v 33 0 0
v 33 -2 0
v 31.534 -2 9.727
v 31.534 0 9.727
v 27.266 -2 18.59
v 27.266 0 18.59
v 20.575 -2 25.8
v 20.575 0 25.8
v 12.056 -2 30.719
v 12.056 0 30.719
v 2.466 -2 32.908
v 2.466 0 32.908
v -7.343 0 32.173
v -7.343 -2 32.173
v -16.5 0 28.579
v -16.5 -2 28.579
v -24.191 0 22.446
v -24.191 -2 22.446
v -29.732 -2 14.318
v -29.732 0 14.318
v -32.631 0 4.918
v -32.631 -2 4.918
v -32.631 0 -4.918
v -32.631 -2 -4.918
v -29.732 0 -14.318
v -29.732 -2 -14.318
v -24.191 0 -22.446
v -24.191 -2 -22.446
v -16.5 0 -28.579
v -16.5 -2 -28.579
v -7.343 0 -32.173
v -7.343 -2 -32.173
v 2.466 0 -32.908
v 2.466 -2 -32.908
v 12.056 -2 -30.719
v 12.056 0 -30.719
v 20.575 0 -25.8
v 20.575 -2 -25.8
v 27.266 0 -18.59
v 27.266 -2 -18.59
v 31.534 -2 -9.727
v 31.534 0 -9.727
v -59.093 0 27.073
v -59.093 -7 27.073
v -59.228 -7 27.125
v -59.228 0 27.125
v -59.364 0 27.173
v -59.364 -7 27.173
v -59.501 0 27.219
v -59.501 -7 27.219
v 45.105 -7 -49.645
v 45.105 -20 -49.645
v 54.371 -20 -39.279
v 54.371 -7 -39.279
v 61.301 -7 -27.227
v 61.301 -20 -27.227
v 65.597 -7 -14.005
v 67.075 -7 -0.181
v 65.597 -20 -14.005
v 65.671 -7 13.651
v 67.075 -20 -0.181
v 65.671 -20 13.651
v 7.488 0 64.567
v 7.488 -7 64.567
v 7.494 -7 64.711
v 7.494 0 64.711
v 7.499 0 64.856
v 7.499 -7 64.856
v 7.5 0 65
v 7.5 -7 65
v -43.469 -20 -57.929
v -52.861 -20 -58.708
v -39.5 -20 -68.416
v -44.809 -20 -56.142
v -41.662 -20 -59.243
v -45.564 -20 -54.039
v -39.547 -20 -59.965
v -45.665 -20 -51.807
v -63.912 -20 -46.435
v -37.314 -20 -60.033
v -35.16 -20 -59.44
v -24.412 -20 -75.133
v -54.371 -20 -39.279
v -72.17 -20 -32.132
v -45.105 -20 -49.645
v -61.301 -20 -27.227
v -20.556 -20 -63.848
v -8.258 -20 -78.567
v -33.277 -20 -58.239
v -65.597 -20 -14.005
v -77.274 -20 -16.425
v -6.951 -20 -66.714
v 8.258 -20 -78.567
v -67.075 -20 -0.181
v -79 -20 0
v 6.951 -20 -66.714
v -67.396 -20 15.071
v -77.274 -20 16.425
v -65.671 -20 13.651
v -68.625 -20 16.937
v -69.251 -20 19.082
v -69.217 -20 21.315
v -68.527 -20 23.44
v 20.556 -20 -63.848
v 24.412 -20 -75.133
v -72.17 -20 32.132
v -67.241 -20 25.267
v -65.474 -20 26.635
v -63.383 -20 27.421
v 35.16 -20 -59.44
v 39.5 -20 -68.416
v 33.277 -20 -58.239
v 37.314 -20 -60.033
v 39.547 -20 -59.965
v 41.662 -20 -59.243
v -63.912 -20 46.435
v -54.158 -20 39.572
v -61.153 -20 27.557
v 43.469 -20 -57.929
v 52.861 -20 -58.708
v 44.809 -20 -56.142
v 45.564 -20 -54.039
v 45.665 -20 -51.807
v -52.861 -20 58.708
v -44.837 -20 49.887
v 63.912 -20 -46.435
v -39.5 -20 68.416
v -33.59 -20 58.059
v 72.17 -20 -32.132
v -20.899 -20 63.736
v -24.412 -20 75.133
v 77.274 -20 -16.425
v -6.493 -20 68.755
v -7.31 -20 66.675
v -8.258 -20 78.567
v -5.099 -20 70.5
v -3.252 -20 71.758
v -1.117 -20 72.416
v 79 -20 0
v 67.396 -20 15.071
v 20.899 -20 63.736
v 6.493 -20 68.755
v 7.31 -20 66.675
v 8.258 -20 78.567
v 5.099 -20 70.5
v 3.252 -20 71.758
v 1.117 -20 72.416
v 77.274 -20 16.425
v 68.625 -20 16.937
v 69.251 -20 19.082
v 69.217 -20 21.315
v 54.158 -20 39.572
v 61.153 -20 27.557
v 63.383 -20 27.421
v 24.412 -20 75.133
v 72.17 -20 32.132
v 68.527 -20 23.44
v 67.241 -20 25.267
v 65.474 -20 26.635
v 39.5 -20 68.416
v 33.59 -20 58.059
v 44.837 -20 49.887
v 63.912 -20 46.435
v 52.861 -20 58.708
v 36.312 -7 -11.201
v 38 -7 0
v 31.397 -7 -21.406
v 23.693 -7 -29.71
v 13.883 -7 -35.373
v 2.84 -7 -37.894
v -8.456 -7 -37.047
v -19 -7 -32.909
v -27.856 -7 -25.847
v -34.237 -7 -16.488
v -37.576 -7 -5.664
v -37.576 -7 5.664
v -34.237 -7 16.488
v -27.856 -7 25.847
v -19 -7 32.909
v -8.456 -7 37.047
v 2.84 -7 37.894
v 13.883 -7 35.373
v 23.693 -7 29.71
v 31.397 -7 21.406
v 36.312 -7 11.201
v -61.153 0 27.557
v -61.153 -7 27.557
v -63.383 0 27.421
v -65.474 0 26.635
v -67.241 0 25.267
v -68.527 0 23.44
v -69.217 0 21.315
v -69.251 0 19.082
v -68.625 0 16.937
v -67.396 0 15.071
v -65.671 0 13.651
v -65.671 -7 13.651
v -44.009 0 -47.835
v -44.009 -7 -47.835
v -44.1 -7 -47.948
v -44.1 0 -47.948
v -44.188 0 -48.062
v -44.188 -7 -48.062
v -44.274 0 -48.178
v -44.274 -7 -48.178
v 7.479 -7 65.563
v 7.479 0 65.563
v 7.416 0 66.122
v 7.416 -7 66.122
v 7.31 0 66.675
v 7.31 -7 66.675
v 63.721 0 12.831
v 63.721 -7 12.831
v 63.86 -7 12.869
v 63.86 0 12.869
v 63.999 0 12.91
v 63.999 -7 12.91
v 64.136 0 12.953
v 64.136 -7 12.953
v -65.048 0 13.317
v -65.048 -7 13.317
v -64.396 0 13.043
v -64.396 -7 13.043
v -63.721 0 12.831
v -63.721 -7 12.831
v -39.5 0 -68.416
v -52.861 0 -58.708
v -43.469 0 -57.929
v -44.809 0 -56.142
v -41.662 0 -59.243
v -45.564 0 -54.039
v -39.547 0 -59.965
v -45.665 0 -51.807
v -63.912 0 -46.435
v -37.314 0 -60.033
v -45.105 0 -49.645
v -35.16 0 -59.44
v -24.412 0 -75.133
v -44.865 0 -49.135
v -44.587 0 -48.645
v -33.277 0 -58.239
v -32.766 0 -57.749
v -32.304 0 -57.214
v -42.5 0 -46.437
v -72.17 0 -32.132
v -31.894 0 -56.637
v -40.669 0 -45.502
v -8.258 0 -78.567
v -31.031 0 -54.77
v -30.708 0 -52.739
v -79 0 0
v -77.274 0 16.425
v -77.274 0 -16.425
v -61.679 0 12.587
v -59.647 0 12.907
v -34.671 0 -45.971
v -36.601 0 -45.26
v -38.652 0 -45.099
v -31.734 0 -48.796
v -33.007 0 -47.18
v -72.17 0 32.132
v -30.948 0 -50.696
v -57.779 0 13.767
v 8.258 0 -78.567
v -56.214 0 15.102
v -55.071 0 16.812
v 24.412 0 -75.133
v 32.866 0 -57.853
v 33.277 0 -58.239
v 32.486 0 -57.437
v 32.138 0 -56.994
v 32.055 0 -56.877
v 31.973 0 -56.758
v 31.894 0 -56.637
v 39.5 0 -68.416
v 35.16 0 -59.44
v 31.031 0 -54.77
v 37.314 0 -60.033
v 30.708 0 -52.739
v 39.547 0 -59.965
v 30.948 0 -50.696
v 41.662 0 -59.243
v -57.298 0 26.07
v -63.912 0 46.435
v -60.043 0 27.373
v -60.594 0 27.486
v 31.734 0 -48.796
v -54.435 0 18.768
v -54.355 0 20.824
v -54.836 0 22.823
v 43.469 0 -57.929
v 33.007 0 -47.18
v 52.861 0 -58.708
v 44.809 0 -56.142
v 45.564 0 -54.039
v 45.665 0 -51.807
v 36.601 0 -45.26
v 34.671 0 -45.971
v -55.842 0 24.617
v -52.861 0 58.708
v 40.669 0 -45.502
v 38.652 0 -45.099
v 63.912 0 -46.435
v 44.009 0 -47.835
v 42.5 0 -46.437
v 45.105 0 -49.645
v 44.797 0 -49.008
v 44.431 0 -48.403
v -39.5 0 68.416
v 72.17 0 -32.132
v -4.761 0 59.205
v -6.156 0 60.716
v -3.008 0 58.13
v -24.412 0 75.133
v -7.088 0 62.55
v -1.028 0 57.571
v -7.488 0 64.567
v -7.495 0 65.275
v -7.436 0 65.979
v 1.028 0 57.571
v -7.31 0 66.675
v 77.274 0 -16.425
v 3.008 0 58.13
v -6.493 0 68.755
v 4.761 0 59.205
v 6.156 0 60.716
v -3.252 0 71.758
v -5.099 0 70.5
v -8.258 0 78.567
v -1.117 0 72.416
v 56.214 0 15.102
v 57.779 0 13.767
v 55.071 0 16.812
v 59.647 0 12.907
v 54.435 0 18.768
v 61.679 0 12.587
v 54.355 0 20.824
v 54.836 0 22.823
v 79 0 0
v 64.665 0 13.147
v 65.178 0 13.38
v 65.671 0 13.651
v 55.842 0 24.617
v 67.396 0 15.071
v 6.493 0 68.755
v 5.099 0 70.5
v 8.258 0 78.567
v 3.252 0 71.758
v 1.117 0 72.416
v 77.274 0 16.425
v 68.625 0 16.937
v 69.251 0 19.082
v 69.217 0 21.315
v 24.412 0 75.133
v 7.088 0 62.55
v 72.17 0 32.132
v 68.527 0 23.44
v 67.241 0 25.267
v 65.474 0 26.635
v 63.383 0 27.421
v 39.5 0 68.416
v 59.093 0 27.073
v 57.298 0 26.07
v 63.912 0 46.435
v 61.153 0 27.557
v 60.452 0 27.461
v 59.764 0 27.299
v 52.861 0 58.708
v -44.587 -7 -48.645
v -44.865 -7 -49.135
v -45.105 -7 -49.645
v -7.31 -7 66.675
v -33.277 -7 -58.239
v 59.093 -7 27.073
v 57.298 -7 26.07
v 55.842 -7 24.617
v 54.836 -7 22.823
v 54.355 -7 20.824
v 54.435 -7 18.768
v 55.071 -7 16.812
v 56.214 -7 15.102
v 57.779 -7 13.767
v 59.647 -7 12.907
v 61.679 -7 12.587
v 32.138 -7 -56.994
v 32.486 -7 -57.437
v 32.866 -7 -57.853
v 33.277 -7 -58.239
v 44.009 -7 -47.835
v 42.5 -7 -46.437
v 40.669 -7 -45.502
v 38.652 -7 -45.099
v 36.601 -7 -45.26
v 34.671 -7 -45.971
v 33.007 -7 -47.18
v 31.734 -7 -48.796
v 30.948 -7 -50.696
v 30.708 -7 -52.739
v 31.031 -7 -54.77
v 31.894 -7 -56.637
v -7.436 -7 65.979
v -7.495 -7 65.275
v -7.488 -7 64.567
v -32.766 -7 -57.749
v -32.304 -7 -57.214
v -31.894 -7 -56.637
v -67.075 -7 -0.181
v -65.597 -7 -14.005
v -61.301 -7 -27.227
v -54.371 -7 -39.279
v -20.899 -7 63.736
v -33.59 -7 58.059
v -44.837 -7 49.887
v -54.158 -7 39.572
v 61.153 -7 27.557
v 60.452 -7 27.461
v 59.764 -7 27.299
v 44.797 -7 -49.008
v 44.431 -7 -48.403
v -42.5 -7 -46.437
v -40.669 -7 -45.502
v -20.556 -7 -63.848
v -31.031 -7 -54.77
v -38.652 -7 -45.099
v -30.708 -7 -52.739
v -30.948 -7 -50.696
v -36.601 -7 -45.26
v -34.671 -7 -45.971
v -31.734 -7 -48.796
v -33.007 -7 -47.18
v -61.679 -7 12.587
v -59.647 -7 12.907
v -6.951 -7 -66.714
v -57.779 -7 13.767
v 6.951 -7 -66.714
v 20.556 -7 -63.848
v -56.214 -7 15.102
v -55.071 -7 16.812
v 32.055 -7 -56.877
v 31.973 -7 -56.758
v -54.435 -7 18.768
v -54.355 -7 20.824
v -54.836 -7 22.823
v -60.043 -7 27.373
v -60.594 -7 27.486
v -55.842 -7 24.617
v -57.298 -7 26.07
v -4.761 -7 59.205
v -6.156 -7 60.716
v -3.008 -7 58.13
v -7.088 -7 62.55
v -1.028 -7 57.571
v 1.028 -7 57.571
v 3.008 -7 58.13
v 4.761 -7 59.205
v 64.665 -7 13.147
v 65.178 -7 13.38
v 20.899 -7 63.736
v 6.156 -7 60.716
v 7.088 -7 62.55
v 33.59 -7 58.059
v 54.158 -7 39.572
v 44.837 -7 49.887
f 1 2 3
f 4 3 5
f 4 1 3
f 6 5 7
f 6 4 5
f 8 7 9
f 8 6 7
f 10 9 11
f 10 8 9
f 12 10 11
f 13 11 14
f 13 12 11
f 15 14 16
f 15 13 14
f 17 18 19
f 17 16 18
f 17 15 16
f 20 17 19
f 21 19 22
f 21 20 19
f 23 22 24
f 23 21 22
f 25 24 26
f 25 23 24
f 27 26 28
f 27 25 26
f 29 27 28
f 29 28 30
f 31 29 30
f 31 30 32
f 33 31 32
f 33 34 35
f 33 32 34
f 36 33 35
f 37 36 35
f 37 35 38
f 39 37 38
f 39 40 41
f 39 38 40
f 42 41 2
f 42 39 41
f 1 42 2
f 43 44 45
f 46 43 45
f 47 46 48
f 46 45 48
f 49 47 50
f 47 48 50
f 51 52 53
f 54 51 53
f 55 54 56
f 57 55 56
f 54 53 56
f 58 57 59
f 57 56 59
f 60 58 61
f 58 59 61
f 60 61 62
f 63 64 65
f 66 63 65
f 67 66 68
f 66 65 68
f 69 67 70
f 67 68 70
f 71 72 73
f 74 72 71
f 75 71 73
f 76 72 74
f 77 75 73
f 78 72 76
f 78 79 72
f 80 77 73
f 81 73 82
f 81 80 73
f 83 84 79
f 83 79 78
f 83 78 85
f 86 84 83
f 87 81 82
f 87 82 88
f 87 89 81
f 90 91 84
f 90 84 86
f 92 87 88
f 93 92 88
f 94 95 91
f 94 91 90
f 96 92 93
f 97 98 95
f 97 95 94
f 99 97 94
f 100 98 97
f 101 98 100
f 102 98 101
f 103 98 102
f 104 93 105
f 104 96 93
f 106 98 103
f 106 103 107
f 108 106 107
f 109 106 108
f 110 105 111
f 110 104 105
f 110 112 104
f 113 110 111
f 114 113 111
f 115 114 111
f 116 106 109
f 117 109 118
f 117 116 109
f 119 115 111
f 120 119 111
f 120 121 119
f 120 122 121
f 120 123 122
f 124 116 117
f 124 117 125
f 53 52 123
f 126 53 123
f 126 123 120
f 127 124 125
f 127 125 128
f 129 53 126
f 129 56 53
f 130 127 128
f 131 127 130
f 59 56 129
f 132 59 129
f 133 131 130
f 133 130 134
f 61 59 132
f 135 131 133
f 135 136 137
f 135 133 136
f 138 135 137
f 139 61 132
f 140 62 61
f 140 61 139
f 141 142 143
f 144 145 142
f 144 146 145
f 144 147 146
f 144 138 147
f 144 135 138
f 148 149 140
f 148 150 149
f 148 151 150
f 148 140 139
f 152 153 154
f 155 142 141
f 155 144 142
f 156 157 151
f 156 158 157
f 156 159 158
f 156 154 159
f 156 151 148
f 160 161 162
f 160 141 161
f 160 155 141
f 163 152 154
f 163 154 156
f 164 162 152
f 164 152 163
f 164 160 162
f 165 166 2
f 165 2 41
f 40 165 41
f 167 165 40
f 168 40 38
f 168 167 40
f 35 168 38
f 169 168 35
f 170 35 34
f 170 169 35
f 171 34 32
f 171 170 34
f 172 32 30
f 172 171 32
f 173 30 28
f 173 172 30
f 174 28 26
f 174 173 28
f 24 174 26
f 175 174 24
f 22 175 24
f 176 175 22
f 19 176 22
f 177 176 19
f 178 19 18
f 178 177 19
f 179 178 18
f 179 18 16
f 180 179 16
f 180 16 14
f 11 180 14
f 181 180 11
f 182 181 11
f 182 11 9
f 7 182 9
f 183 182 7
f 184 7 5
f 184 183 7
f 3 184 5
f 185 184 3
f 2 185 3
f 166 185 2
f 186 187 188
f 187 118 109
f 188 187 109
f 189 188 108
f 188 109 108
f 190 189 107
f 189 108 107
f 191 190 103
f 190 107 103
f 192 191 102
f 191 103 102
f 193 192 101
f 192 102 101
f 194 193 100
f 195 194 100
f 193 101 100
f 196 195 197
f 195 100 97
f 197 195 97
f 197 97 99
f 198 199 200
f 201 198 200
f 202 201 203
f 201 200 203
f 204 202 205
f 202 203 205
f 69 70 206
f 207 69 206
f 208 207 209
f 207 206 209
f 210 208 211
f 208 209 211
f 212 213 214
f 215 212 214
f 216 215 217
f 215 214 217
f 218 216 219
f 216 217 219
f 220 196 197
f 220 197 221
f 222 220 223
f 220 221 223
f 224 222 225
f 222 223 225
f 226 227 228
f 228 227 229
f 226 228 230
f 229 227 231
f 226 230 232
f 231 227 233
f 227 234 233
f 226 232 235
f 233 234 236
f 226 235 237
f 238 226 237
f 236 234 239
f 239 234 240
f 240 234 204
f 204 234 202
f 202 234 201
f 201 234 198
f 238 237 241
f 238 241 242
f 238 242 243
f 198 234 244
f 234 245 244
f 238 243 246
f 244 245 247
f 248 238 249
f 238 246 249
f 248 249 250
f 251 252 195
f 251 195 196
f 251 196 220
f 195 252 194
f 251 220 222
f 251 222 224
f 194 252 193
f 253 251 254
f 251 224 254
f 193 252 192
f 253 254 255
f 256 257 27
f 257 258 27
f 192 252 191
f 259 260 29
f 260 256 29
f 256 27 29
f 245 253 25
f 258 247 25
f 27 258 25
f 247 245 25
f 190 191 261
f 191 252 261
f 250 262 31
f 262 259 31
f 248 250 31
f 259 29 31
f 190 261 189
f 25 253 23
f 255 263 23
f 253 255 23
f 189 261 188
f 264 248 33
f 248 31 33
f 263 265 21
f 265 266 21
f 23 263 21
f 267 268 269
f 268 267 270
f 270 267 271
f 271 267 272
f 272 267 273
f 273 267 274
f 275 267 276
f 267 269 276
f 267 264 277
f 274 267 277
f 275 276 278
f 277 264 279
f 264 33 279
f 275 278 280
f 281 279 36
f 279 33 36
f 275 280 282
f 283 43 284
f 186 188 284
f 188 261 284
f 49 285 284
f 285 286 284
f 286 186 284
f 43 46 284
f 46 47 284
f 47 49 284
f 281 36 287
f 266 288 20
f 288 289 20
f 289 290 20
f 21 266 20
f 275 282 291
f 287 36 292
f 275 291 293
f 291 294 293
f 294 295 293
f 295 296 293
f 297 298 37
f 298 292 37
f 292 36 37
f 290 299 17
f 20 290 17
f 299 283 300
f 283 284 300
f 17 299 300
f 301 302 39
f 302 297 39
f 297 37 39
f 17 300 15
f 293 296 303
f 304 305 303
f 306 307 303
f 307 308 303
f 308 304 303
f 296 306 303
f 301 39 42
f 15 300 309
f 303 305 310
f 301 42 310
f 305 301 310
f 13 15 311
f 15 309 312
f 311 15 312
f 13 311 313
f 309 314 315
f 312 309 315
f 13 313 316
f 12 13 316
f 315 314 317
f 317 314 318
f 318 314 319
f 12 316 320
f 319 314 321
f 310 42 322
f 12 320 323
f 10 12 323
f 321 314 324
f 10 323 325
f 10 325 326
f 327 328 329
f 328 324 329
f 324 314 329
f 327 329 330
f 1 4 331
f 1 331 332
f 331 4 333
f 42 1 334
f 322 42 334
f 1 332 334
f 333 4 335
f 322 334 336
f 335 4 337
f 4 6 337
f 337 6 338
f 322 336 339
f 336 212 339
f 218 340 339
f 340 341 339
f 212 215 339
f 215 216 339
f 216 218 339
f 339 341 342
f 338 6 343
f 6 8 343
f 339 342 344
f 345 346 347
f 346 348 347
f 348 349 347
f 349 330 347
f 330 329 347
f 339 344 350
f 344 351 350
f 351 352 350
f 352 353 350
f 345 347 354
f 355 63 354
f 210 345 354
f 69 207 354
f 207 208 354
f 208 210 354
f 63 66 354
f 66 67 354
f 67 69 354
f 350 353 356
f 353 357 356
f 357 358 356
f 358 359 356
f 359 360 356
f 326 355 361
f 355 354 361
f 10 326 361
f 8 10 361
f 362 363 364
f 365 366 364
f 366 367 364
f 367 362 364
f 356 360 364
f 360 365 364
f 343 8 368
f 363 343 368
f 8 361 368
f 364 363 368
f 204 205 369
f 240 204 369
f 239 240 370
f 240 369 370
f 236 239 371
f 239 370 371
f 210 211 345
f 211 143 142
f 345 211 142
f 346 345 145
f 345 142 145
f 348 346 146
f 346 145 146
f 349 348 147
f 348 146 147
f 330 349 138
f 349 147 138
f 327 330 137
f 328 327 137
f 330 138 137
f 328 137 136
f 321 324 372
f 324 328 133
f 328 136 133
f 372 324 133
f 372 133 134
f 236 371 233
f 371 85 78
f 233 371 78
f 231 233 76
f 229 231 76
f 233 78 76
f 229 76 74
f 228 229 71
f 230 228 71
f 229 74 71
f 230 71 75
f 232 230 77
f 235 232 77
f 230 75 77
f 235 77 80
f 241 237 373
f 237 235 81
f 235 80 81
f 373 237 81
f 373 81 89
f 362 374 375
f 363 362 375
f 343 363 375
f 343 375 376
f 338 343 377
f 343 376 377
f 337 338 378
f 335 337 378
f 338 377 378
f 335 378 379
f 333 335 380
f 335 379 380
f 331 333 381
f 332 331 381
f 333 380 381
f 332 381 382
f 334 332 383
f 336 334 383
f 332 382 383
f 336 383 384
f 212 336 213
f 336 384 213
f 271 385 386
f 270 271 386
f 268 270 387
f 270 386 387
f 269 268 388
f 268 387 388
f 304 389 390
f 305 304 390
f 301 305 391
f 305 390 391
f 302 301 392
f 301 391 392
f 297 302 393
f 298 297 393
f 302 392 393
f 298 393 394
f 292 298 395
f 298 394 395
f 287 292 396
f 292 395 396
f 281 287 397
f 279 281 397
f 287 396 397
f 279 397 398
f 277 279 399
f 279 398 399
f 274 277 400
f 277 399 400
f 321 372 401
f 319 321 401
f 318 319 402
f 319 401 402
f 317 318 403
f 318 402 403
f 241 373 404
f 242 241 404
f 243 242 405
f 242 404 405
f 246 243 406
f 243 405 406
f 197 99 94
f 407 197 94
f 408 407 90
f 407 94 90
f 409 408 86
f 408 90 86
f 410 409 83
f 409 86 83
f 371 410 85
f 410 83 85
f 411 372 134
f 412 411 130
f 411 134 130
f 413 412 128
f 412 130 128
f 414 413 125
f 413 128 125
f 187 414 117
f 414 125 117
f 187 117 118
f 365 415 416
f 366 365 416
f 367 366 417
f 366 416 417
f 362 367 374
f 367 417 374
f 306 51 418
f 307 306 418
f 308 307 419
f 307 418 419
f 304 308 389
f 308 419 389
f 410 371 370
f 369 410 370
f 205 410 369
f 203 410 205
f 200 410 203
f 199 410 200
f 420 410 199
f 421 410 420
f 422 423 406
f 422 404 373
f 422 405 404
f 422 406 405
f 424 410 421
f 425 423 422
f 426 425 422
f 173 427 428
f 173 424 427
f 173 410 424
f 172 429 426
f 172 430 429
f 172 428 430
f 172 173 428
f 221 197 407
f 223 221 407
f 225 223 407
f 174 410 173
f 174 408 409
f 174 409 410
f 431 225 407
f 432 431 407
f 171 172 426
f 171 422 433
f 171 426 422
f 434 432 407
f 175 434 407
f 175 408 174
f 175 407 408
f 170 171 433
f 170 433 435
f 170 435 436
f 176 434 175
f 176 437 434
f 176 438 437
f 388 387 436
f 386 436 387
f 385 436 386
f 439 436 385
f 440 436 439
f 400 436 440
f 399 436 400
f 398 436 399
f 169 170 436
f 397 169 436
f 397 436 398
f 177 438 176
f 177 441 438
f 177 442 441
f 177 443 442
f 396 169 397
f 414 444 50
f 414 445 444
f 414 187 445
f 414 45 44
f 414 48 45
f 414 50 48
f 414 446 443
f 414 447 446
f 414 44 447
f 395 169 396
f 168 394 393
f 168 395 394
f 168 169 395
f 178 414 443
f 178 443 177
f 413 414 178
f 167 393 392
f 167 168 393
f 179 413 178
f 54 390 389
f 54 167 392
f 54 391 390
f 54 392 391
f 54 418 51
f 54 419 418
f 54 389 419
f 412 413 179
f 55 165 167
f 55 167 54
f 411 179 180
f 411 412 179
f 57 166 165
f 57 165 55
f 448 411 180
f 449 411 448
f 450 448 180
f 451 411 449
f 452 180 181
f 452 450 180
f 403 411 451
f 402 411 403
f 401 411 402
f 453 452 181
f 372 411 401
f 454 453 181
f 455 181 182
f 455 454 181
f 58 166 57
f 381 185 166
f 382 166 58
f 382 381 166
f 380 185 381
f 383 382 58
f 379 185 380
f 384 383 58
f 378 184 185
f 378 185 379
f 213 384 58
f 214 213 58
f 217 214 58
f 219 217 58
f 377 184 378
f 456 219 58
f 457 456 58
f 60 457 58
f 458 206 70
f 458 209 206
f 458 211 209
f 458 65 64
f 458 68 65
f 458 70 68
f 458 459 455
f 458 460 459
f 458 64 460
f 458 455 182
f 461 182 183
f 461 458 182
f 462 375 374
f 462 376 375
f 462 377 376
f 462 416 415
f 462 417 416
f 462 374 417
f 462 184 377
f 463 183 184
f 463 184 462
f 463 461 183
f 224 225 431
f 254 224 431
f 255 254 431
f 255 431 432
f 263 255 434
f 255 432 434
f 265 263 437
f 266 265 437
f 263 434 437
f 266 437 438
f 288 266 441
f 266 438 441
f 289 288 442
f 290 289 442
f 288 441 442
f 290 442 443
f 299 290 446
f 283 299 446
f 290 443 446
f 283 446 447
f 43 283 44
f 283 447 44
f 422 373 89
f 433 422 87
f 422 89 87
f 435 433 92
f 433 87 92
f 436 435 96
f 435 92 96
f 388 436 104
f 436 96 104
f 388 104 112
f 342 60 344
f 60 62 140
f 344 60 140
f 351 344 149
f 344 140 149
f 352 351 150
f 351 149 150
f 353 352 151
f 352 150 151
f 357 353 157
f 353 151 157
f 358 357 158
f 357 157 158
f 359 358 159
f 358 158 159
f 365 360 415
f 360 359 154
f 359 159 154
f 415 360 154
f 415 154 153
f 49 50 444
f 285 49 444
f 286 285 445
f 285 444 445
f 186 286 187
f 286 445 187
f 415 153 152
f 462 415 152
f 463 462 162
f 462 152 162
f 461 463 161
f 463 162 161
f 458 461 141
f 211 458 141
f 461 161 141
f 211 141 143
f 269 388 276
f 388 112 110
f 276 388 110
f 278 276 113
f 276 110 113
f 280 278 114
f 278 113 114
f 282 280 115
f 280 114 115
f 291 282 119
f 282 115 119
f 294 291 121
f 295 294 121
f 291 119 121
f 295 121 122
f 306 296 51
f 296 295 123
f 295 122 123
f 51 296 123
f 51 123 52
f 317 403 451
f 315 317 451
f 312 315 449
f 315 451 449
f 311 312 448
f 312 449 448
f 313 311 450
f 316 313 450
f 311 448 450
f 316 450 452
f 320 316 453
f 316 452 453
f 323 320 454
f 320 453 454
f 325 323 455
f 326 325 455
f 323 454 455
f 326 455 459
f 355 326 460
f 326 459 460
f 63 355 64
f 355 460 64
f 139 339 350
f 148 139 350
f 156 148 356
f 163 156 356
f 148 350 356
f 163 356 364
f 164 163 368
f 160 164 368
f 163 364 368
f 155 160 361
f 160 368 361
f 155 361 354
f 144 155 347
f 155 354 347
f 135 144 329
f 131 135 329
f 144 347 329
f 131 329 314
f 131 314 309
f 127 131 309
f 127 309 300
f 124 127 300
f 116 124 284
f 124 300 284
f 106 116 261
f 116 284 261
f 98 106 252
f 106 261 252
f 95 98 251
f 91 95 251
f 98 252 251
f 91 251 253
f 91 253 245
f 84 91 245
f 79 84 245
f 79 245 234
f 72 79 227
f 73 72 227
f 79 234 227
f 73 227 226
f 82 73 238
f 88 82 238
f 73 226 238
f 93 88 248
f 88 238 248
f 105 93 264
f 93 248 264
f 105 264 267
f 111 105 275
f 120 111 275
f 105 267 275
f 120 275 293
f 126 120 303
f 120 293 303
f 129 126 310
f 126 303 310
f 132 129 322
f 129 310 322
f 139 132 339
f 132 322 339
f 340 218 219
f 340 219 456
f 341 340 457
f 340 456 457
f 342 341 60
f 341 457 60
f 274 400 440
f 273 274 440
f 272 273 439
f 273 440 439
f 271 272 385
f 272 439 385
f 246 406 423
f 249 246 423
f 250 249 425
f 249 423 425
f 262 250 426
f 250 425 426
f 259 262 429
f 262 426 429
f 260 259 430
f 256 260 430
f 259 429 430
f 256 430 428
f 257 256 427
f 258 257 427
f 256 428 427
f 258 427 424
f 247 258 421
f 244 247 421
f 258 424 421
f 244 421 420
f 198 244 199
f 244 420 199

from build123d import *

# Parameters (mm, degrees)
F0_R            = 79
F0_R_2          = 33
F1_DEPTH        = 20
F2_R            = 67.075
F3_DEPTH        = 13
F4_SIZE         = 5
F6_DEPTH        = 20.001
F6_COPIES_COUNT = 5


# Not quite as in the source:
# - a pattern or mirror of a feature is missing from the dataset's text; its kind, count and spacing are read off the source's solid


with BuildPart() as f1:
    # F0 (on Front) → F1 (new body)
    with BuildSketch(Plane.XZ):
        Circle(F0_R)
        Circle(F0_R_2, mode=Mode.SUBTRACT)
    extrude(amount=F1_DEPTH)

    # F2 (on face) → F3 (cut)
    with BuildSketch(Plane.XZ.offset(20)):
        Circle(F2_R)
    extrude(amount=-F3_DEPTH, mode=Mode.SUBTRACT)

    # F4
    f4_edges = [f1.edges().sort_by_distance(p)[0] for p in [
        (-33, -7, 0),
    ]]
    chamfer(f4_edges, length=F4_SIZE)

    # F5 (on face) → F6 (cut, through all)
    with BuildSketch(Plane.XZ.offset(20)):
        with BuildLine():
            ThreePointArc((-7.4875080879, 64.5673076923), (0, 57.5), (7.4875080879, 64.5673076923))
            ThreePointArc((7.4875080879, 64.5673076923), (0, 65), (-7.4875080879, 64.5673076923))
        make_face()
        with BuildLine():
            ThreePointArc((-7.4875080879, 64.5673076923), (0, 65), (7.4875080879, 64.5673076923))
            ThreePointArc((7.4875080879, 64.5673076923), (7.4968763715, 64.7835637039), (7.5, 65))
            ThreePointArc((7.5, 65), (7.4524663535, 65.843057086), (7.3104679333, 66.6754278846))
            ThreePointArc((7.3104679333, 66.6754278846), (0, 67.075), (-7.3104679333, 66.6754278846))
            ThreePointArc((-7.3104679333, 66.6754278846), (-7.4736916091, 65.6276414045), (-7.4875080879, 64.5673076923))
        make_face()
        with BuildLine():
            ThreePointArc((7.3104679333, 66.6754278846), (0, 72.5), (-7.3104679333, 66.6754278846))
            ThreePointArc((-7.3104679333, 66.6754278846), (0, 67.075), (7.3104679333, 66.6754278846))
        make_face()
    f6 = extrude(amount=-F6_DEPTH, mode=Mode.SUBTRACT)

    # F6_copies: F6 ×5 about axis
    f6_copies_axis = Axis((0, 0, 0), (0, 1, 0))
    for i in range(1, F6_COPIES_COUNT):
        add(f6.rotate(f6_copies_axis, i * 360 / F6_COPIES_COUNT), mode=Mode.SUBTRACT)


solid = f1.part
